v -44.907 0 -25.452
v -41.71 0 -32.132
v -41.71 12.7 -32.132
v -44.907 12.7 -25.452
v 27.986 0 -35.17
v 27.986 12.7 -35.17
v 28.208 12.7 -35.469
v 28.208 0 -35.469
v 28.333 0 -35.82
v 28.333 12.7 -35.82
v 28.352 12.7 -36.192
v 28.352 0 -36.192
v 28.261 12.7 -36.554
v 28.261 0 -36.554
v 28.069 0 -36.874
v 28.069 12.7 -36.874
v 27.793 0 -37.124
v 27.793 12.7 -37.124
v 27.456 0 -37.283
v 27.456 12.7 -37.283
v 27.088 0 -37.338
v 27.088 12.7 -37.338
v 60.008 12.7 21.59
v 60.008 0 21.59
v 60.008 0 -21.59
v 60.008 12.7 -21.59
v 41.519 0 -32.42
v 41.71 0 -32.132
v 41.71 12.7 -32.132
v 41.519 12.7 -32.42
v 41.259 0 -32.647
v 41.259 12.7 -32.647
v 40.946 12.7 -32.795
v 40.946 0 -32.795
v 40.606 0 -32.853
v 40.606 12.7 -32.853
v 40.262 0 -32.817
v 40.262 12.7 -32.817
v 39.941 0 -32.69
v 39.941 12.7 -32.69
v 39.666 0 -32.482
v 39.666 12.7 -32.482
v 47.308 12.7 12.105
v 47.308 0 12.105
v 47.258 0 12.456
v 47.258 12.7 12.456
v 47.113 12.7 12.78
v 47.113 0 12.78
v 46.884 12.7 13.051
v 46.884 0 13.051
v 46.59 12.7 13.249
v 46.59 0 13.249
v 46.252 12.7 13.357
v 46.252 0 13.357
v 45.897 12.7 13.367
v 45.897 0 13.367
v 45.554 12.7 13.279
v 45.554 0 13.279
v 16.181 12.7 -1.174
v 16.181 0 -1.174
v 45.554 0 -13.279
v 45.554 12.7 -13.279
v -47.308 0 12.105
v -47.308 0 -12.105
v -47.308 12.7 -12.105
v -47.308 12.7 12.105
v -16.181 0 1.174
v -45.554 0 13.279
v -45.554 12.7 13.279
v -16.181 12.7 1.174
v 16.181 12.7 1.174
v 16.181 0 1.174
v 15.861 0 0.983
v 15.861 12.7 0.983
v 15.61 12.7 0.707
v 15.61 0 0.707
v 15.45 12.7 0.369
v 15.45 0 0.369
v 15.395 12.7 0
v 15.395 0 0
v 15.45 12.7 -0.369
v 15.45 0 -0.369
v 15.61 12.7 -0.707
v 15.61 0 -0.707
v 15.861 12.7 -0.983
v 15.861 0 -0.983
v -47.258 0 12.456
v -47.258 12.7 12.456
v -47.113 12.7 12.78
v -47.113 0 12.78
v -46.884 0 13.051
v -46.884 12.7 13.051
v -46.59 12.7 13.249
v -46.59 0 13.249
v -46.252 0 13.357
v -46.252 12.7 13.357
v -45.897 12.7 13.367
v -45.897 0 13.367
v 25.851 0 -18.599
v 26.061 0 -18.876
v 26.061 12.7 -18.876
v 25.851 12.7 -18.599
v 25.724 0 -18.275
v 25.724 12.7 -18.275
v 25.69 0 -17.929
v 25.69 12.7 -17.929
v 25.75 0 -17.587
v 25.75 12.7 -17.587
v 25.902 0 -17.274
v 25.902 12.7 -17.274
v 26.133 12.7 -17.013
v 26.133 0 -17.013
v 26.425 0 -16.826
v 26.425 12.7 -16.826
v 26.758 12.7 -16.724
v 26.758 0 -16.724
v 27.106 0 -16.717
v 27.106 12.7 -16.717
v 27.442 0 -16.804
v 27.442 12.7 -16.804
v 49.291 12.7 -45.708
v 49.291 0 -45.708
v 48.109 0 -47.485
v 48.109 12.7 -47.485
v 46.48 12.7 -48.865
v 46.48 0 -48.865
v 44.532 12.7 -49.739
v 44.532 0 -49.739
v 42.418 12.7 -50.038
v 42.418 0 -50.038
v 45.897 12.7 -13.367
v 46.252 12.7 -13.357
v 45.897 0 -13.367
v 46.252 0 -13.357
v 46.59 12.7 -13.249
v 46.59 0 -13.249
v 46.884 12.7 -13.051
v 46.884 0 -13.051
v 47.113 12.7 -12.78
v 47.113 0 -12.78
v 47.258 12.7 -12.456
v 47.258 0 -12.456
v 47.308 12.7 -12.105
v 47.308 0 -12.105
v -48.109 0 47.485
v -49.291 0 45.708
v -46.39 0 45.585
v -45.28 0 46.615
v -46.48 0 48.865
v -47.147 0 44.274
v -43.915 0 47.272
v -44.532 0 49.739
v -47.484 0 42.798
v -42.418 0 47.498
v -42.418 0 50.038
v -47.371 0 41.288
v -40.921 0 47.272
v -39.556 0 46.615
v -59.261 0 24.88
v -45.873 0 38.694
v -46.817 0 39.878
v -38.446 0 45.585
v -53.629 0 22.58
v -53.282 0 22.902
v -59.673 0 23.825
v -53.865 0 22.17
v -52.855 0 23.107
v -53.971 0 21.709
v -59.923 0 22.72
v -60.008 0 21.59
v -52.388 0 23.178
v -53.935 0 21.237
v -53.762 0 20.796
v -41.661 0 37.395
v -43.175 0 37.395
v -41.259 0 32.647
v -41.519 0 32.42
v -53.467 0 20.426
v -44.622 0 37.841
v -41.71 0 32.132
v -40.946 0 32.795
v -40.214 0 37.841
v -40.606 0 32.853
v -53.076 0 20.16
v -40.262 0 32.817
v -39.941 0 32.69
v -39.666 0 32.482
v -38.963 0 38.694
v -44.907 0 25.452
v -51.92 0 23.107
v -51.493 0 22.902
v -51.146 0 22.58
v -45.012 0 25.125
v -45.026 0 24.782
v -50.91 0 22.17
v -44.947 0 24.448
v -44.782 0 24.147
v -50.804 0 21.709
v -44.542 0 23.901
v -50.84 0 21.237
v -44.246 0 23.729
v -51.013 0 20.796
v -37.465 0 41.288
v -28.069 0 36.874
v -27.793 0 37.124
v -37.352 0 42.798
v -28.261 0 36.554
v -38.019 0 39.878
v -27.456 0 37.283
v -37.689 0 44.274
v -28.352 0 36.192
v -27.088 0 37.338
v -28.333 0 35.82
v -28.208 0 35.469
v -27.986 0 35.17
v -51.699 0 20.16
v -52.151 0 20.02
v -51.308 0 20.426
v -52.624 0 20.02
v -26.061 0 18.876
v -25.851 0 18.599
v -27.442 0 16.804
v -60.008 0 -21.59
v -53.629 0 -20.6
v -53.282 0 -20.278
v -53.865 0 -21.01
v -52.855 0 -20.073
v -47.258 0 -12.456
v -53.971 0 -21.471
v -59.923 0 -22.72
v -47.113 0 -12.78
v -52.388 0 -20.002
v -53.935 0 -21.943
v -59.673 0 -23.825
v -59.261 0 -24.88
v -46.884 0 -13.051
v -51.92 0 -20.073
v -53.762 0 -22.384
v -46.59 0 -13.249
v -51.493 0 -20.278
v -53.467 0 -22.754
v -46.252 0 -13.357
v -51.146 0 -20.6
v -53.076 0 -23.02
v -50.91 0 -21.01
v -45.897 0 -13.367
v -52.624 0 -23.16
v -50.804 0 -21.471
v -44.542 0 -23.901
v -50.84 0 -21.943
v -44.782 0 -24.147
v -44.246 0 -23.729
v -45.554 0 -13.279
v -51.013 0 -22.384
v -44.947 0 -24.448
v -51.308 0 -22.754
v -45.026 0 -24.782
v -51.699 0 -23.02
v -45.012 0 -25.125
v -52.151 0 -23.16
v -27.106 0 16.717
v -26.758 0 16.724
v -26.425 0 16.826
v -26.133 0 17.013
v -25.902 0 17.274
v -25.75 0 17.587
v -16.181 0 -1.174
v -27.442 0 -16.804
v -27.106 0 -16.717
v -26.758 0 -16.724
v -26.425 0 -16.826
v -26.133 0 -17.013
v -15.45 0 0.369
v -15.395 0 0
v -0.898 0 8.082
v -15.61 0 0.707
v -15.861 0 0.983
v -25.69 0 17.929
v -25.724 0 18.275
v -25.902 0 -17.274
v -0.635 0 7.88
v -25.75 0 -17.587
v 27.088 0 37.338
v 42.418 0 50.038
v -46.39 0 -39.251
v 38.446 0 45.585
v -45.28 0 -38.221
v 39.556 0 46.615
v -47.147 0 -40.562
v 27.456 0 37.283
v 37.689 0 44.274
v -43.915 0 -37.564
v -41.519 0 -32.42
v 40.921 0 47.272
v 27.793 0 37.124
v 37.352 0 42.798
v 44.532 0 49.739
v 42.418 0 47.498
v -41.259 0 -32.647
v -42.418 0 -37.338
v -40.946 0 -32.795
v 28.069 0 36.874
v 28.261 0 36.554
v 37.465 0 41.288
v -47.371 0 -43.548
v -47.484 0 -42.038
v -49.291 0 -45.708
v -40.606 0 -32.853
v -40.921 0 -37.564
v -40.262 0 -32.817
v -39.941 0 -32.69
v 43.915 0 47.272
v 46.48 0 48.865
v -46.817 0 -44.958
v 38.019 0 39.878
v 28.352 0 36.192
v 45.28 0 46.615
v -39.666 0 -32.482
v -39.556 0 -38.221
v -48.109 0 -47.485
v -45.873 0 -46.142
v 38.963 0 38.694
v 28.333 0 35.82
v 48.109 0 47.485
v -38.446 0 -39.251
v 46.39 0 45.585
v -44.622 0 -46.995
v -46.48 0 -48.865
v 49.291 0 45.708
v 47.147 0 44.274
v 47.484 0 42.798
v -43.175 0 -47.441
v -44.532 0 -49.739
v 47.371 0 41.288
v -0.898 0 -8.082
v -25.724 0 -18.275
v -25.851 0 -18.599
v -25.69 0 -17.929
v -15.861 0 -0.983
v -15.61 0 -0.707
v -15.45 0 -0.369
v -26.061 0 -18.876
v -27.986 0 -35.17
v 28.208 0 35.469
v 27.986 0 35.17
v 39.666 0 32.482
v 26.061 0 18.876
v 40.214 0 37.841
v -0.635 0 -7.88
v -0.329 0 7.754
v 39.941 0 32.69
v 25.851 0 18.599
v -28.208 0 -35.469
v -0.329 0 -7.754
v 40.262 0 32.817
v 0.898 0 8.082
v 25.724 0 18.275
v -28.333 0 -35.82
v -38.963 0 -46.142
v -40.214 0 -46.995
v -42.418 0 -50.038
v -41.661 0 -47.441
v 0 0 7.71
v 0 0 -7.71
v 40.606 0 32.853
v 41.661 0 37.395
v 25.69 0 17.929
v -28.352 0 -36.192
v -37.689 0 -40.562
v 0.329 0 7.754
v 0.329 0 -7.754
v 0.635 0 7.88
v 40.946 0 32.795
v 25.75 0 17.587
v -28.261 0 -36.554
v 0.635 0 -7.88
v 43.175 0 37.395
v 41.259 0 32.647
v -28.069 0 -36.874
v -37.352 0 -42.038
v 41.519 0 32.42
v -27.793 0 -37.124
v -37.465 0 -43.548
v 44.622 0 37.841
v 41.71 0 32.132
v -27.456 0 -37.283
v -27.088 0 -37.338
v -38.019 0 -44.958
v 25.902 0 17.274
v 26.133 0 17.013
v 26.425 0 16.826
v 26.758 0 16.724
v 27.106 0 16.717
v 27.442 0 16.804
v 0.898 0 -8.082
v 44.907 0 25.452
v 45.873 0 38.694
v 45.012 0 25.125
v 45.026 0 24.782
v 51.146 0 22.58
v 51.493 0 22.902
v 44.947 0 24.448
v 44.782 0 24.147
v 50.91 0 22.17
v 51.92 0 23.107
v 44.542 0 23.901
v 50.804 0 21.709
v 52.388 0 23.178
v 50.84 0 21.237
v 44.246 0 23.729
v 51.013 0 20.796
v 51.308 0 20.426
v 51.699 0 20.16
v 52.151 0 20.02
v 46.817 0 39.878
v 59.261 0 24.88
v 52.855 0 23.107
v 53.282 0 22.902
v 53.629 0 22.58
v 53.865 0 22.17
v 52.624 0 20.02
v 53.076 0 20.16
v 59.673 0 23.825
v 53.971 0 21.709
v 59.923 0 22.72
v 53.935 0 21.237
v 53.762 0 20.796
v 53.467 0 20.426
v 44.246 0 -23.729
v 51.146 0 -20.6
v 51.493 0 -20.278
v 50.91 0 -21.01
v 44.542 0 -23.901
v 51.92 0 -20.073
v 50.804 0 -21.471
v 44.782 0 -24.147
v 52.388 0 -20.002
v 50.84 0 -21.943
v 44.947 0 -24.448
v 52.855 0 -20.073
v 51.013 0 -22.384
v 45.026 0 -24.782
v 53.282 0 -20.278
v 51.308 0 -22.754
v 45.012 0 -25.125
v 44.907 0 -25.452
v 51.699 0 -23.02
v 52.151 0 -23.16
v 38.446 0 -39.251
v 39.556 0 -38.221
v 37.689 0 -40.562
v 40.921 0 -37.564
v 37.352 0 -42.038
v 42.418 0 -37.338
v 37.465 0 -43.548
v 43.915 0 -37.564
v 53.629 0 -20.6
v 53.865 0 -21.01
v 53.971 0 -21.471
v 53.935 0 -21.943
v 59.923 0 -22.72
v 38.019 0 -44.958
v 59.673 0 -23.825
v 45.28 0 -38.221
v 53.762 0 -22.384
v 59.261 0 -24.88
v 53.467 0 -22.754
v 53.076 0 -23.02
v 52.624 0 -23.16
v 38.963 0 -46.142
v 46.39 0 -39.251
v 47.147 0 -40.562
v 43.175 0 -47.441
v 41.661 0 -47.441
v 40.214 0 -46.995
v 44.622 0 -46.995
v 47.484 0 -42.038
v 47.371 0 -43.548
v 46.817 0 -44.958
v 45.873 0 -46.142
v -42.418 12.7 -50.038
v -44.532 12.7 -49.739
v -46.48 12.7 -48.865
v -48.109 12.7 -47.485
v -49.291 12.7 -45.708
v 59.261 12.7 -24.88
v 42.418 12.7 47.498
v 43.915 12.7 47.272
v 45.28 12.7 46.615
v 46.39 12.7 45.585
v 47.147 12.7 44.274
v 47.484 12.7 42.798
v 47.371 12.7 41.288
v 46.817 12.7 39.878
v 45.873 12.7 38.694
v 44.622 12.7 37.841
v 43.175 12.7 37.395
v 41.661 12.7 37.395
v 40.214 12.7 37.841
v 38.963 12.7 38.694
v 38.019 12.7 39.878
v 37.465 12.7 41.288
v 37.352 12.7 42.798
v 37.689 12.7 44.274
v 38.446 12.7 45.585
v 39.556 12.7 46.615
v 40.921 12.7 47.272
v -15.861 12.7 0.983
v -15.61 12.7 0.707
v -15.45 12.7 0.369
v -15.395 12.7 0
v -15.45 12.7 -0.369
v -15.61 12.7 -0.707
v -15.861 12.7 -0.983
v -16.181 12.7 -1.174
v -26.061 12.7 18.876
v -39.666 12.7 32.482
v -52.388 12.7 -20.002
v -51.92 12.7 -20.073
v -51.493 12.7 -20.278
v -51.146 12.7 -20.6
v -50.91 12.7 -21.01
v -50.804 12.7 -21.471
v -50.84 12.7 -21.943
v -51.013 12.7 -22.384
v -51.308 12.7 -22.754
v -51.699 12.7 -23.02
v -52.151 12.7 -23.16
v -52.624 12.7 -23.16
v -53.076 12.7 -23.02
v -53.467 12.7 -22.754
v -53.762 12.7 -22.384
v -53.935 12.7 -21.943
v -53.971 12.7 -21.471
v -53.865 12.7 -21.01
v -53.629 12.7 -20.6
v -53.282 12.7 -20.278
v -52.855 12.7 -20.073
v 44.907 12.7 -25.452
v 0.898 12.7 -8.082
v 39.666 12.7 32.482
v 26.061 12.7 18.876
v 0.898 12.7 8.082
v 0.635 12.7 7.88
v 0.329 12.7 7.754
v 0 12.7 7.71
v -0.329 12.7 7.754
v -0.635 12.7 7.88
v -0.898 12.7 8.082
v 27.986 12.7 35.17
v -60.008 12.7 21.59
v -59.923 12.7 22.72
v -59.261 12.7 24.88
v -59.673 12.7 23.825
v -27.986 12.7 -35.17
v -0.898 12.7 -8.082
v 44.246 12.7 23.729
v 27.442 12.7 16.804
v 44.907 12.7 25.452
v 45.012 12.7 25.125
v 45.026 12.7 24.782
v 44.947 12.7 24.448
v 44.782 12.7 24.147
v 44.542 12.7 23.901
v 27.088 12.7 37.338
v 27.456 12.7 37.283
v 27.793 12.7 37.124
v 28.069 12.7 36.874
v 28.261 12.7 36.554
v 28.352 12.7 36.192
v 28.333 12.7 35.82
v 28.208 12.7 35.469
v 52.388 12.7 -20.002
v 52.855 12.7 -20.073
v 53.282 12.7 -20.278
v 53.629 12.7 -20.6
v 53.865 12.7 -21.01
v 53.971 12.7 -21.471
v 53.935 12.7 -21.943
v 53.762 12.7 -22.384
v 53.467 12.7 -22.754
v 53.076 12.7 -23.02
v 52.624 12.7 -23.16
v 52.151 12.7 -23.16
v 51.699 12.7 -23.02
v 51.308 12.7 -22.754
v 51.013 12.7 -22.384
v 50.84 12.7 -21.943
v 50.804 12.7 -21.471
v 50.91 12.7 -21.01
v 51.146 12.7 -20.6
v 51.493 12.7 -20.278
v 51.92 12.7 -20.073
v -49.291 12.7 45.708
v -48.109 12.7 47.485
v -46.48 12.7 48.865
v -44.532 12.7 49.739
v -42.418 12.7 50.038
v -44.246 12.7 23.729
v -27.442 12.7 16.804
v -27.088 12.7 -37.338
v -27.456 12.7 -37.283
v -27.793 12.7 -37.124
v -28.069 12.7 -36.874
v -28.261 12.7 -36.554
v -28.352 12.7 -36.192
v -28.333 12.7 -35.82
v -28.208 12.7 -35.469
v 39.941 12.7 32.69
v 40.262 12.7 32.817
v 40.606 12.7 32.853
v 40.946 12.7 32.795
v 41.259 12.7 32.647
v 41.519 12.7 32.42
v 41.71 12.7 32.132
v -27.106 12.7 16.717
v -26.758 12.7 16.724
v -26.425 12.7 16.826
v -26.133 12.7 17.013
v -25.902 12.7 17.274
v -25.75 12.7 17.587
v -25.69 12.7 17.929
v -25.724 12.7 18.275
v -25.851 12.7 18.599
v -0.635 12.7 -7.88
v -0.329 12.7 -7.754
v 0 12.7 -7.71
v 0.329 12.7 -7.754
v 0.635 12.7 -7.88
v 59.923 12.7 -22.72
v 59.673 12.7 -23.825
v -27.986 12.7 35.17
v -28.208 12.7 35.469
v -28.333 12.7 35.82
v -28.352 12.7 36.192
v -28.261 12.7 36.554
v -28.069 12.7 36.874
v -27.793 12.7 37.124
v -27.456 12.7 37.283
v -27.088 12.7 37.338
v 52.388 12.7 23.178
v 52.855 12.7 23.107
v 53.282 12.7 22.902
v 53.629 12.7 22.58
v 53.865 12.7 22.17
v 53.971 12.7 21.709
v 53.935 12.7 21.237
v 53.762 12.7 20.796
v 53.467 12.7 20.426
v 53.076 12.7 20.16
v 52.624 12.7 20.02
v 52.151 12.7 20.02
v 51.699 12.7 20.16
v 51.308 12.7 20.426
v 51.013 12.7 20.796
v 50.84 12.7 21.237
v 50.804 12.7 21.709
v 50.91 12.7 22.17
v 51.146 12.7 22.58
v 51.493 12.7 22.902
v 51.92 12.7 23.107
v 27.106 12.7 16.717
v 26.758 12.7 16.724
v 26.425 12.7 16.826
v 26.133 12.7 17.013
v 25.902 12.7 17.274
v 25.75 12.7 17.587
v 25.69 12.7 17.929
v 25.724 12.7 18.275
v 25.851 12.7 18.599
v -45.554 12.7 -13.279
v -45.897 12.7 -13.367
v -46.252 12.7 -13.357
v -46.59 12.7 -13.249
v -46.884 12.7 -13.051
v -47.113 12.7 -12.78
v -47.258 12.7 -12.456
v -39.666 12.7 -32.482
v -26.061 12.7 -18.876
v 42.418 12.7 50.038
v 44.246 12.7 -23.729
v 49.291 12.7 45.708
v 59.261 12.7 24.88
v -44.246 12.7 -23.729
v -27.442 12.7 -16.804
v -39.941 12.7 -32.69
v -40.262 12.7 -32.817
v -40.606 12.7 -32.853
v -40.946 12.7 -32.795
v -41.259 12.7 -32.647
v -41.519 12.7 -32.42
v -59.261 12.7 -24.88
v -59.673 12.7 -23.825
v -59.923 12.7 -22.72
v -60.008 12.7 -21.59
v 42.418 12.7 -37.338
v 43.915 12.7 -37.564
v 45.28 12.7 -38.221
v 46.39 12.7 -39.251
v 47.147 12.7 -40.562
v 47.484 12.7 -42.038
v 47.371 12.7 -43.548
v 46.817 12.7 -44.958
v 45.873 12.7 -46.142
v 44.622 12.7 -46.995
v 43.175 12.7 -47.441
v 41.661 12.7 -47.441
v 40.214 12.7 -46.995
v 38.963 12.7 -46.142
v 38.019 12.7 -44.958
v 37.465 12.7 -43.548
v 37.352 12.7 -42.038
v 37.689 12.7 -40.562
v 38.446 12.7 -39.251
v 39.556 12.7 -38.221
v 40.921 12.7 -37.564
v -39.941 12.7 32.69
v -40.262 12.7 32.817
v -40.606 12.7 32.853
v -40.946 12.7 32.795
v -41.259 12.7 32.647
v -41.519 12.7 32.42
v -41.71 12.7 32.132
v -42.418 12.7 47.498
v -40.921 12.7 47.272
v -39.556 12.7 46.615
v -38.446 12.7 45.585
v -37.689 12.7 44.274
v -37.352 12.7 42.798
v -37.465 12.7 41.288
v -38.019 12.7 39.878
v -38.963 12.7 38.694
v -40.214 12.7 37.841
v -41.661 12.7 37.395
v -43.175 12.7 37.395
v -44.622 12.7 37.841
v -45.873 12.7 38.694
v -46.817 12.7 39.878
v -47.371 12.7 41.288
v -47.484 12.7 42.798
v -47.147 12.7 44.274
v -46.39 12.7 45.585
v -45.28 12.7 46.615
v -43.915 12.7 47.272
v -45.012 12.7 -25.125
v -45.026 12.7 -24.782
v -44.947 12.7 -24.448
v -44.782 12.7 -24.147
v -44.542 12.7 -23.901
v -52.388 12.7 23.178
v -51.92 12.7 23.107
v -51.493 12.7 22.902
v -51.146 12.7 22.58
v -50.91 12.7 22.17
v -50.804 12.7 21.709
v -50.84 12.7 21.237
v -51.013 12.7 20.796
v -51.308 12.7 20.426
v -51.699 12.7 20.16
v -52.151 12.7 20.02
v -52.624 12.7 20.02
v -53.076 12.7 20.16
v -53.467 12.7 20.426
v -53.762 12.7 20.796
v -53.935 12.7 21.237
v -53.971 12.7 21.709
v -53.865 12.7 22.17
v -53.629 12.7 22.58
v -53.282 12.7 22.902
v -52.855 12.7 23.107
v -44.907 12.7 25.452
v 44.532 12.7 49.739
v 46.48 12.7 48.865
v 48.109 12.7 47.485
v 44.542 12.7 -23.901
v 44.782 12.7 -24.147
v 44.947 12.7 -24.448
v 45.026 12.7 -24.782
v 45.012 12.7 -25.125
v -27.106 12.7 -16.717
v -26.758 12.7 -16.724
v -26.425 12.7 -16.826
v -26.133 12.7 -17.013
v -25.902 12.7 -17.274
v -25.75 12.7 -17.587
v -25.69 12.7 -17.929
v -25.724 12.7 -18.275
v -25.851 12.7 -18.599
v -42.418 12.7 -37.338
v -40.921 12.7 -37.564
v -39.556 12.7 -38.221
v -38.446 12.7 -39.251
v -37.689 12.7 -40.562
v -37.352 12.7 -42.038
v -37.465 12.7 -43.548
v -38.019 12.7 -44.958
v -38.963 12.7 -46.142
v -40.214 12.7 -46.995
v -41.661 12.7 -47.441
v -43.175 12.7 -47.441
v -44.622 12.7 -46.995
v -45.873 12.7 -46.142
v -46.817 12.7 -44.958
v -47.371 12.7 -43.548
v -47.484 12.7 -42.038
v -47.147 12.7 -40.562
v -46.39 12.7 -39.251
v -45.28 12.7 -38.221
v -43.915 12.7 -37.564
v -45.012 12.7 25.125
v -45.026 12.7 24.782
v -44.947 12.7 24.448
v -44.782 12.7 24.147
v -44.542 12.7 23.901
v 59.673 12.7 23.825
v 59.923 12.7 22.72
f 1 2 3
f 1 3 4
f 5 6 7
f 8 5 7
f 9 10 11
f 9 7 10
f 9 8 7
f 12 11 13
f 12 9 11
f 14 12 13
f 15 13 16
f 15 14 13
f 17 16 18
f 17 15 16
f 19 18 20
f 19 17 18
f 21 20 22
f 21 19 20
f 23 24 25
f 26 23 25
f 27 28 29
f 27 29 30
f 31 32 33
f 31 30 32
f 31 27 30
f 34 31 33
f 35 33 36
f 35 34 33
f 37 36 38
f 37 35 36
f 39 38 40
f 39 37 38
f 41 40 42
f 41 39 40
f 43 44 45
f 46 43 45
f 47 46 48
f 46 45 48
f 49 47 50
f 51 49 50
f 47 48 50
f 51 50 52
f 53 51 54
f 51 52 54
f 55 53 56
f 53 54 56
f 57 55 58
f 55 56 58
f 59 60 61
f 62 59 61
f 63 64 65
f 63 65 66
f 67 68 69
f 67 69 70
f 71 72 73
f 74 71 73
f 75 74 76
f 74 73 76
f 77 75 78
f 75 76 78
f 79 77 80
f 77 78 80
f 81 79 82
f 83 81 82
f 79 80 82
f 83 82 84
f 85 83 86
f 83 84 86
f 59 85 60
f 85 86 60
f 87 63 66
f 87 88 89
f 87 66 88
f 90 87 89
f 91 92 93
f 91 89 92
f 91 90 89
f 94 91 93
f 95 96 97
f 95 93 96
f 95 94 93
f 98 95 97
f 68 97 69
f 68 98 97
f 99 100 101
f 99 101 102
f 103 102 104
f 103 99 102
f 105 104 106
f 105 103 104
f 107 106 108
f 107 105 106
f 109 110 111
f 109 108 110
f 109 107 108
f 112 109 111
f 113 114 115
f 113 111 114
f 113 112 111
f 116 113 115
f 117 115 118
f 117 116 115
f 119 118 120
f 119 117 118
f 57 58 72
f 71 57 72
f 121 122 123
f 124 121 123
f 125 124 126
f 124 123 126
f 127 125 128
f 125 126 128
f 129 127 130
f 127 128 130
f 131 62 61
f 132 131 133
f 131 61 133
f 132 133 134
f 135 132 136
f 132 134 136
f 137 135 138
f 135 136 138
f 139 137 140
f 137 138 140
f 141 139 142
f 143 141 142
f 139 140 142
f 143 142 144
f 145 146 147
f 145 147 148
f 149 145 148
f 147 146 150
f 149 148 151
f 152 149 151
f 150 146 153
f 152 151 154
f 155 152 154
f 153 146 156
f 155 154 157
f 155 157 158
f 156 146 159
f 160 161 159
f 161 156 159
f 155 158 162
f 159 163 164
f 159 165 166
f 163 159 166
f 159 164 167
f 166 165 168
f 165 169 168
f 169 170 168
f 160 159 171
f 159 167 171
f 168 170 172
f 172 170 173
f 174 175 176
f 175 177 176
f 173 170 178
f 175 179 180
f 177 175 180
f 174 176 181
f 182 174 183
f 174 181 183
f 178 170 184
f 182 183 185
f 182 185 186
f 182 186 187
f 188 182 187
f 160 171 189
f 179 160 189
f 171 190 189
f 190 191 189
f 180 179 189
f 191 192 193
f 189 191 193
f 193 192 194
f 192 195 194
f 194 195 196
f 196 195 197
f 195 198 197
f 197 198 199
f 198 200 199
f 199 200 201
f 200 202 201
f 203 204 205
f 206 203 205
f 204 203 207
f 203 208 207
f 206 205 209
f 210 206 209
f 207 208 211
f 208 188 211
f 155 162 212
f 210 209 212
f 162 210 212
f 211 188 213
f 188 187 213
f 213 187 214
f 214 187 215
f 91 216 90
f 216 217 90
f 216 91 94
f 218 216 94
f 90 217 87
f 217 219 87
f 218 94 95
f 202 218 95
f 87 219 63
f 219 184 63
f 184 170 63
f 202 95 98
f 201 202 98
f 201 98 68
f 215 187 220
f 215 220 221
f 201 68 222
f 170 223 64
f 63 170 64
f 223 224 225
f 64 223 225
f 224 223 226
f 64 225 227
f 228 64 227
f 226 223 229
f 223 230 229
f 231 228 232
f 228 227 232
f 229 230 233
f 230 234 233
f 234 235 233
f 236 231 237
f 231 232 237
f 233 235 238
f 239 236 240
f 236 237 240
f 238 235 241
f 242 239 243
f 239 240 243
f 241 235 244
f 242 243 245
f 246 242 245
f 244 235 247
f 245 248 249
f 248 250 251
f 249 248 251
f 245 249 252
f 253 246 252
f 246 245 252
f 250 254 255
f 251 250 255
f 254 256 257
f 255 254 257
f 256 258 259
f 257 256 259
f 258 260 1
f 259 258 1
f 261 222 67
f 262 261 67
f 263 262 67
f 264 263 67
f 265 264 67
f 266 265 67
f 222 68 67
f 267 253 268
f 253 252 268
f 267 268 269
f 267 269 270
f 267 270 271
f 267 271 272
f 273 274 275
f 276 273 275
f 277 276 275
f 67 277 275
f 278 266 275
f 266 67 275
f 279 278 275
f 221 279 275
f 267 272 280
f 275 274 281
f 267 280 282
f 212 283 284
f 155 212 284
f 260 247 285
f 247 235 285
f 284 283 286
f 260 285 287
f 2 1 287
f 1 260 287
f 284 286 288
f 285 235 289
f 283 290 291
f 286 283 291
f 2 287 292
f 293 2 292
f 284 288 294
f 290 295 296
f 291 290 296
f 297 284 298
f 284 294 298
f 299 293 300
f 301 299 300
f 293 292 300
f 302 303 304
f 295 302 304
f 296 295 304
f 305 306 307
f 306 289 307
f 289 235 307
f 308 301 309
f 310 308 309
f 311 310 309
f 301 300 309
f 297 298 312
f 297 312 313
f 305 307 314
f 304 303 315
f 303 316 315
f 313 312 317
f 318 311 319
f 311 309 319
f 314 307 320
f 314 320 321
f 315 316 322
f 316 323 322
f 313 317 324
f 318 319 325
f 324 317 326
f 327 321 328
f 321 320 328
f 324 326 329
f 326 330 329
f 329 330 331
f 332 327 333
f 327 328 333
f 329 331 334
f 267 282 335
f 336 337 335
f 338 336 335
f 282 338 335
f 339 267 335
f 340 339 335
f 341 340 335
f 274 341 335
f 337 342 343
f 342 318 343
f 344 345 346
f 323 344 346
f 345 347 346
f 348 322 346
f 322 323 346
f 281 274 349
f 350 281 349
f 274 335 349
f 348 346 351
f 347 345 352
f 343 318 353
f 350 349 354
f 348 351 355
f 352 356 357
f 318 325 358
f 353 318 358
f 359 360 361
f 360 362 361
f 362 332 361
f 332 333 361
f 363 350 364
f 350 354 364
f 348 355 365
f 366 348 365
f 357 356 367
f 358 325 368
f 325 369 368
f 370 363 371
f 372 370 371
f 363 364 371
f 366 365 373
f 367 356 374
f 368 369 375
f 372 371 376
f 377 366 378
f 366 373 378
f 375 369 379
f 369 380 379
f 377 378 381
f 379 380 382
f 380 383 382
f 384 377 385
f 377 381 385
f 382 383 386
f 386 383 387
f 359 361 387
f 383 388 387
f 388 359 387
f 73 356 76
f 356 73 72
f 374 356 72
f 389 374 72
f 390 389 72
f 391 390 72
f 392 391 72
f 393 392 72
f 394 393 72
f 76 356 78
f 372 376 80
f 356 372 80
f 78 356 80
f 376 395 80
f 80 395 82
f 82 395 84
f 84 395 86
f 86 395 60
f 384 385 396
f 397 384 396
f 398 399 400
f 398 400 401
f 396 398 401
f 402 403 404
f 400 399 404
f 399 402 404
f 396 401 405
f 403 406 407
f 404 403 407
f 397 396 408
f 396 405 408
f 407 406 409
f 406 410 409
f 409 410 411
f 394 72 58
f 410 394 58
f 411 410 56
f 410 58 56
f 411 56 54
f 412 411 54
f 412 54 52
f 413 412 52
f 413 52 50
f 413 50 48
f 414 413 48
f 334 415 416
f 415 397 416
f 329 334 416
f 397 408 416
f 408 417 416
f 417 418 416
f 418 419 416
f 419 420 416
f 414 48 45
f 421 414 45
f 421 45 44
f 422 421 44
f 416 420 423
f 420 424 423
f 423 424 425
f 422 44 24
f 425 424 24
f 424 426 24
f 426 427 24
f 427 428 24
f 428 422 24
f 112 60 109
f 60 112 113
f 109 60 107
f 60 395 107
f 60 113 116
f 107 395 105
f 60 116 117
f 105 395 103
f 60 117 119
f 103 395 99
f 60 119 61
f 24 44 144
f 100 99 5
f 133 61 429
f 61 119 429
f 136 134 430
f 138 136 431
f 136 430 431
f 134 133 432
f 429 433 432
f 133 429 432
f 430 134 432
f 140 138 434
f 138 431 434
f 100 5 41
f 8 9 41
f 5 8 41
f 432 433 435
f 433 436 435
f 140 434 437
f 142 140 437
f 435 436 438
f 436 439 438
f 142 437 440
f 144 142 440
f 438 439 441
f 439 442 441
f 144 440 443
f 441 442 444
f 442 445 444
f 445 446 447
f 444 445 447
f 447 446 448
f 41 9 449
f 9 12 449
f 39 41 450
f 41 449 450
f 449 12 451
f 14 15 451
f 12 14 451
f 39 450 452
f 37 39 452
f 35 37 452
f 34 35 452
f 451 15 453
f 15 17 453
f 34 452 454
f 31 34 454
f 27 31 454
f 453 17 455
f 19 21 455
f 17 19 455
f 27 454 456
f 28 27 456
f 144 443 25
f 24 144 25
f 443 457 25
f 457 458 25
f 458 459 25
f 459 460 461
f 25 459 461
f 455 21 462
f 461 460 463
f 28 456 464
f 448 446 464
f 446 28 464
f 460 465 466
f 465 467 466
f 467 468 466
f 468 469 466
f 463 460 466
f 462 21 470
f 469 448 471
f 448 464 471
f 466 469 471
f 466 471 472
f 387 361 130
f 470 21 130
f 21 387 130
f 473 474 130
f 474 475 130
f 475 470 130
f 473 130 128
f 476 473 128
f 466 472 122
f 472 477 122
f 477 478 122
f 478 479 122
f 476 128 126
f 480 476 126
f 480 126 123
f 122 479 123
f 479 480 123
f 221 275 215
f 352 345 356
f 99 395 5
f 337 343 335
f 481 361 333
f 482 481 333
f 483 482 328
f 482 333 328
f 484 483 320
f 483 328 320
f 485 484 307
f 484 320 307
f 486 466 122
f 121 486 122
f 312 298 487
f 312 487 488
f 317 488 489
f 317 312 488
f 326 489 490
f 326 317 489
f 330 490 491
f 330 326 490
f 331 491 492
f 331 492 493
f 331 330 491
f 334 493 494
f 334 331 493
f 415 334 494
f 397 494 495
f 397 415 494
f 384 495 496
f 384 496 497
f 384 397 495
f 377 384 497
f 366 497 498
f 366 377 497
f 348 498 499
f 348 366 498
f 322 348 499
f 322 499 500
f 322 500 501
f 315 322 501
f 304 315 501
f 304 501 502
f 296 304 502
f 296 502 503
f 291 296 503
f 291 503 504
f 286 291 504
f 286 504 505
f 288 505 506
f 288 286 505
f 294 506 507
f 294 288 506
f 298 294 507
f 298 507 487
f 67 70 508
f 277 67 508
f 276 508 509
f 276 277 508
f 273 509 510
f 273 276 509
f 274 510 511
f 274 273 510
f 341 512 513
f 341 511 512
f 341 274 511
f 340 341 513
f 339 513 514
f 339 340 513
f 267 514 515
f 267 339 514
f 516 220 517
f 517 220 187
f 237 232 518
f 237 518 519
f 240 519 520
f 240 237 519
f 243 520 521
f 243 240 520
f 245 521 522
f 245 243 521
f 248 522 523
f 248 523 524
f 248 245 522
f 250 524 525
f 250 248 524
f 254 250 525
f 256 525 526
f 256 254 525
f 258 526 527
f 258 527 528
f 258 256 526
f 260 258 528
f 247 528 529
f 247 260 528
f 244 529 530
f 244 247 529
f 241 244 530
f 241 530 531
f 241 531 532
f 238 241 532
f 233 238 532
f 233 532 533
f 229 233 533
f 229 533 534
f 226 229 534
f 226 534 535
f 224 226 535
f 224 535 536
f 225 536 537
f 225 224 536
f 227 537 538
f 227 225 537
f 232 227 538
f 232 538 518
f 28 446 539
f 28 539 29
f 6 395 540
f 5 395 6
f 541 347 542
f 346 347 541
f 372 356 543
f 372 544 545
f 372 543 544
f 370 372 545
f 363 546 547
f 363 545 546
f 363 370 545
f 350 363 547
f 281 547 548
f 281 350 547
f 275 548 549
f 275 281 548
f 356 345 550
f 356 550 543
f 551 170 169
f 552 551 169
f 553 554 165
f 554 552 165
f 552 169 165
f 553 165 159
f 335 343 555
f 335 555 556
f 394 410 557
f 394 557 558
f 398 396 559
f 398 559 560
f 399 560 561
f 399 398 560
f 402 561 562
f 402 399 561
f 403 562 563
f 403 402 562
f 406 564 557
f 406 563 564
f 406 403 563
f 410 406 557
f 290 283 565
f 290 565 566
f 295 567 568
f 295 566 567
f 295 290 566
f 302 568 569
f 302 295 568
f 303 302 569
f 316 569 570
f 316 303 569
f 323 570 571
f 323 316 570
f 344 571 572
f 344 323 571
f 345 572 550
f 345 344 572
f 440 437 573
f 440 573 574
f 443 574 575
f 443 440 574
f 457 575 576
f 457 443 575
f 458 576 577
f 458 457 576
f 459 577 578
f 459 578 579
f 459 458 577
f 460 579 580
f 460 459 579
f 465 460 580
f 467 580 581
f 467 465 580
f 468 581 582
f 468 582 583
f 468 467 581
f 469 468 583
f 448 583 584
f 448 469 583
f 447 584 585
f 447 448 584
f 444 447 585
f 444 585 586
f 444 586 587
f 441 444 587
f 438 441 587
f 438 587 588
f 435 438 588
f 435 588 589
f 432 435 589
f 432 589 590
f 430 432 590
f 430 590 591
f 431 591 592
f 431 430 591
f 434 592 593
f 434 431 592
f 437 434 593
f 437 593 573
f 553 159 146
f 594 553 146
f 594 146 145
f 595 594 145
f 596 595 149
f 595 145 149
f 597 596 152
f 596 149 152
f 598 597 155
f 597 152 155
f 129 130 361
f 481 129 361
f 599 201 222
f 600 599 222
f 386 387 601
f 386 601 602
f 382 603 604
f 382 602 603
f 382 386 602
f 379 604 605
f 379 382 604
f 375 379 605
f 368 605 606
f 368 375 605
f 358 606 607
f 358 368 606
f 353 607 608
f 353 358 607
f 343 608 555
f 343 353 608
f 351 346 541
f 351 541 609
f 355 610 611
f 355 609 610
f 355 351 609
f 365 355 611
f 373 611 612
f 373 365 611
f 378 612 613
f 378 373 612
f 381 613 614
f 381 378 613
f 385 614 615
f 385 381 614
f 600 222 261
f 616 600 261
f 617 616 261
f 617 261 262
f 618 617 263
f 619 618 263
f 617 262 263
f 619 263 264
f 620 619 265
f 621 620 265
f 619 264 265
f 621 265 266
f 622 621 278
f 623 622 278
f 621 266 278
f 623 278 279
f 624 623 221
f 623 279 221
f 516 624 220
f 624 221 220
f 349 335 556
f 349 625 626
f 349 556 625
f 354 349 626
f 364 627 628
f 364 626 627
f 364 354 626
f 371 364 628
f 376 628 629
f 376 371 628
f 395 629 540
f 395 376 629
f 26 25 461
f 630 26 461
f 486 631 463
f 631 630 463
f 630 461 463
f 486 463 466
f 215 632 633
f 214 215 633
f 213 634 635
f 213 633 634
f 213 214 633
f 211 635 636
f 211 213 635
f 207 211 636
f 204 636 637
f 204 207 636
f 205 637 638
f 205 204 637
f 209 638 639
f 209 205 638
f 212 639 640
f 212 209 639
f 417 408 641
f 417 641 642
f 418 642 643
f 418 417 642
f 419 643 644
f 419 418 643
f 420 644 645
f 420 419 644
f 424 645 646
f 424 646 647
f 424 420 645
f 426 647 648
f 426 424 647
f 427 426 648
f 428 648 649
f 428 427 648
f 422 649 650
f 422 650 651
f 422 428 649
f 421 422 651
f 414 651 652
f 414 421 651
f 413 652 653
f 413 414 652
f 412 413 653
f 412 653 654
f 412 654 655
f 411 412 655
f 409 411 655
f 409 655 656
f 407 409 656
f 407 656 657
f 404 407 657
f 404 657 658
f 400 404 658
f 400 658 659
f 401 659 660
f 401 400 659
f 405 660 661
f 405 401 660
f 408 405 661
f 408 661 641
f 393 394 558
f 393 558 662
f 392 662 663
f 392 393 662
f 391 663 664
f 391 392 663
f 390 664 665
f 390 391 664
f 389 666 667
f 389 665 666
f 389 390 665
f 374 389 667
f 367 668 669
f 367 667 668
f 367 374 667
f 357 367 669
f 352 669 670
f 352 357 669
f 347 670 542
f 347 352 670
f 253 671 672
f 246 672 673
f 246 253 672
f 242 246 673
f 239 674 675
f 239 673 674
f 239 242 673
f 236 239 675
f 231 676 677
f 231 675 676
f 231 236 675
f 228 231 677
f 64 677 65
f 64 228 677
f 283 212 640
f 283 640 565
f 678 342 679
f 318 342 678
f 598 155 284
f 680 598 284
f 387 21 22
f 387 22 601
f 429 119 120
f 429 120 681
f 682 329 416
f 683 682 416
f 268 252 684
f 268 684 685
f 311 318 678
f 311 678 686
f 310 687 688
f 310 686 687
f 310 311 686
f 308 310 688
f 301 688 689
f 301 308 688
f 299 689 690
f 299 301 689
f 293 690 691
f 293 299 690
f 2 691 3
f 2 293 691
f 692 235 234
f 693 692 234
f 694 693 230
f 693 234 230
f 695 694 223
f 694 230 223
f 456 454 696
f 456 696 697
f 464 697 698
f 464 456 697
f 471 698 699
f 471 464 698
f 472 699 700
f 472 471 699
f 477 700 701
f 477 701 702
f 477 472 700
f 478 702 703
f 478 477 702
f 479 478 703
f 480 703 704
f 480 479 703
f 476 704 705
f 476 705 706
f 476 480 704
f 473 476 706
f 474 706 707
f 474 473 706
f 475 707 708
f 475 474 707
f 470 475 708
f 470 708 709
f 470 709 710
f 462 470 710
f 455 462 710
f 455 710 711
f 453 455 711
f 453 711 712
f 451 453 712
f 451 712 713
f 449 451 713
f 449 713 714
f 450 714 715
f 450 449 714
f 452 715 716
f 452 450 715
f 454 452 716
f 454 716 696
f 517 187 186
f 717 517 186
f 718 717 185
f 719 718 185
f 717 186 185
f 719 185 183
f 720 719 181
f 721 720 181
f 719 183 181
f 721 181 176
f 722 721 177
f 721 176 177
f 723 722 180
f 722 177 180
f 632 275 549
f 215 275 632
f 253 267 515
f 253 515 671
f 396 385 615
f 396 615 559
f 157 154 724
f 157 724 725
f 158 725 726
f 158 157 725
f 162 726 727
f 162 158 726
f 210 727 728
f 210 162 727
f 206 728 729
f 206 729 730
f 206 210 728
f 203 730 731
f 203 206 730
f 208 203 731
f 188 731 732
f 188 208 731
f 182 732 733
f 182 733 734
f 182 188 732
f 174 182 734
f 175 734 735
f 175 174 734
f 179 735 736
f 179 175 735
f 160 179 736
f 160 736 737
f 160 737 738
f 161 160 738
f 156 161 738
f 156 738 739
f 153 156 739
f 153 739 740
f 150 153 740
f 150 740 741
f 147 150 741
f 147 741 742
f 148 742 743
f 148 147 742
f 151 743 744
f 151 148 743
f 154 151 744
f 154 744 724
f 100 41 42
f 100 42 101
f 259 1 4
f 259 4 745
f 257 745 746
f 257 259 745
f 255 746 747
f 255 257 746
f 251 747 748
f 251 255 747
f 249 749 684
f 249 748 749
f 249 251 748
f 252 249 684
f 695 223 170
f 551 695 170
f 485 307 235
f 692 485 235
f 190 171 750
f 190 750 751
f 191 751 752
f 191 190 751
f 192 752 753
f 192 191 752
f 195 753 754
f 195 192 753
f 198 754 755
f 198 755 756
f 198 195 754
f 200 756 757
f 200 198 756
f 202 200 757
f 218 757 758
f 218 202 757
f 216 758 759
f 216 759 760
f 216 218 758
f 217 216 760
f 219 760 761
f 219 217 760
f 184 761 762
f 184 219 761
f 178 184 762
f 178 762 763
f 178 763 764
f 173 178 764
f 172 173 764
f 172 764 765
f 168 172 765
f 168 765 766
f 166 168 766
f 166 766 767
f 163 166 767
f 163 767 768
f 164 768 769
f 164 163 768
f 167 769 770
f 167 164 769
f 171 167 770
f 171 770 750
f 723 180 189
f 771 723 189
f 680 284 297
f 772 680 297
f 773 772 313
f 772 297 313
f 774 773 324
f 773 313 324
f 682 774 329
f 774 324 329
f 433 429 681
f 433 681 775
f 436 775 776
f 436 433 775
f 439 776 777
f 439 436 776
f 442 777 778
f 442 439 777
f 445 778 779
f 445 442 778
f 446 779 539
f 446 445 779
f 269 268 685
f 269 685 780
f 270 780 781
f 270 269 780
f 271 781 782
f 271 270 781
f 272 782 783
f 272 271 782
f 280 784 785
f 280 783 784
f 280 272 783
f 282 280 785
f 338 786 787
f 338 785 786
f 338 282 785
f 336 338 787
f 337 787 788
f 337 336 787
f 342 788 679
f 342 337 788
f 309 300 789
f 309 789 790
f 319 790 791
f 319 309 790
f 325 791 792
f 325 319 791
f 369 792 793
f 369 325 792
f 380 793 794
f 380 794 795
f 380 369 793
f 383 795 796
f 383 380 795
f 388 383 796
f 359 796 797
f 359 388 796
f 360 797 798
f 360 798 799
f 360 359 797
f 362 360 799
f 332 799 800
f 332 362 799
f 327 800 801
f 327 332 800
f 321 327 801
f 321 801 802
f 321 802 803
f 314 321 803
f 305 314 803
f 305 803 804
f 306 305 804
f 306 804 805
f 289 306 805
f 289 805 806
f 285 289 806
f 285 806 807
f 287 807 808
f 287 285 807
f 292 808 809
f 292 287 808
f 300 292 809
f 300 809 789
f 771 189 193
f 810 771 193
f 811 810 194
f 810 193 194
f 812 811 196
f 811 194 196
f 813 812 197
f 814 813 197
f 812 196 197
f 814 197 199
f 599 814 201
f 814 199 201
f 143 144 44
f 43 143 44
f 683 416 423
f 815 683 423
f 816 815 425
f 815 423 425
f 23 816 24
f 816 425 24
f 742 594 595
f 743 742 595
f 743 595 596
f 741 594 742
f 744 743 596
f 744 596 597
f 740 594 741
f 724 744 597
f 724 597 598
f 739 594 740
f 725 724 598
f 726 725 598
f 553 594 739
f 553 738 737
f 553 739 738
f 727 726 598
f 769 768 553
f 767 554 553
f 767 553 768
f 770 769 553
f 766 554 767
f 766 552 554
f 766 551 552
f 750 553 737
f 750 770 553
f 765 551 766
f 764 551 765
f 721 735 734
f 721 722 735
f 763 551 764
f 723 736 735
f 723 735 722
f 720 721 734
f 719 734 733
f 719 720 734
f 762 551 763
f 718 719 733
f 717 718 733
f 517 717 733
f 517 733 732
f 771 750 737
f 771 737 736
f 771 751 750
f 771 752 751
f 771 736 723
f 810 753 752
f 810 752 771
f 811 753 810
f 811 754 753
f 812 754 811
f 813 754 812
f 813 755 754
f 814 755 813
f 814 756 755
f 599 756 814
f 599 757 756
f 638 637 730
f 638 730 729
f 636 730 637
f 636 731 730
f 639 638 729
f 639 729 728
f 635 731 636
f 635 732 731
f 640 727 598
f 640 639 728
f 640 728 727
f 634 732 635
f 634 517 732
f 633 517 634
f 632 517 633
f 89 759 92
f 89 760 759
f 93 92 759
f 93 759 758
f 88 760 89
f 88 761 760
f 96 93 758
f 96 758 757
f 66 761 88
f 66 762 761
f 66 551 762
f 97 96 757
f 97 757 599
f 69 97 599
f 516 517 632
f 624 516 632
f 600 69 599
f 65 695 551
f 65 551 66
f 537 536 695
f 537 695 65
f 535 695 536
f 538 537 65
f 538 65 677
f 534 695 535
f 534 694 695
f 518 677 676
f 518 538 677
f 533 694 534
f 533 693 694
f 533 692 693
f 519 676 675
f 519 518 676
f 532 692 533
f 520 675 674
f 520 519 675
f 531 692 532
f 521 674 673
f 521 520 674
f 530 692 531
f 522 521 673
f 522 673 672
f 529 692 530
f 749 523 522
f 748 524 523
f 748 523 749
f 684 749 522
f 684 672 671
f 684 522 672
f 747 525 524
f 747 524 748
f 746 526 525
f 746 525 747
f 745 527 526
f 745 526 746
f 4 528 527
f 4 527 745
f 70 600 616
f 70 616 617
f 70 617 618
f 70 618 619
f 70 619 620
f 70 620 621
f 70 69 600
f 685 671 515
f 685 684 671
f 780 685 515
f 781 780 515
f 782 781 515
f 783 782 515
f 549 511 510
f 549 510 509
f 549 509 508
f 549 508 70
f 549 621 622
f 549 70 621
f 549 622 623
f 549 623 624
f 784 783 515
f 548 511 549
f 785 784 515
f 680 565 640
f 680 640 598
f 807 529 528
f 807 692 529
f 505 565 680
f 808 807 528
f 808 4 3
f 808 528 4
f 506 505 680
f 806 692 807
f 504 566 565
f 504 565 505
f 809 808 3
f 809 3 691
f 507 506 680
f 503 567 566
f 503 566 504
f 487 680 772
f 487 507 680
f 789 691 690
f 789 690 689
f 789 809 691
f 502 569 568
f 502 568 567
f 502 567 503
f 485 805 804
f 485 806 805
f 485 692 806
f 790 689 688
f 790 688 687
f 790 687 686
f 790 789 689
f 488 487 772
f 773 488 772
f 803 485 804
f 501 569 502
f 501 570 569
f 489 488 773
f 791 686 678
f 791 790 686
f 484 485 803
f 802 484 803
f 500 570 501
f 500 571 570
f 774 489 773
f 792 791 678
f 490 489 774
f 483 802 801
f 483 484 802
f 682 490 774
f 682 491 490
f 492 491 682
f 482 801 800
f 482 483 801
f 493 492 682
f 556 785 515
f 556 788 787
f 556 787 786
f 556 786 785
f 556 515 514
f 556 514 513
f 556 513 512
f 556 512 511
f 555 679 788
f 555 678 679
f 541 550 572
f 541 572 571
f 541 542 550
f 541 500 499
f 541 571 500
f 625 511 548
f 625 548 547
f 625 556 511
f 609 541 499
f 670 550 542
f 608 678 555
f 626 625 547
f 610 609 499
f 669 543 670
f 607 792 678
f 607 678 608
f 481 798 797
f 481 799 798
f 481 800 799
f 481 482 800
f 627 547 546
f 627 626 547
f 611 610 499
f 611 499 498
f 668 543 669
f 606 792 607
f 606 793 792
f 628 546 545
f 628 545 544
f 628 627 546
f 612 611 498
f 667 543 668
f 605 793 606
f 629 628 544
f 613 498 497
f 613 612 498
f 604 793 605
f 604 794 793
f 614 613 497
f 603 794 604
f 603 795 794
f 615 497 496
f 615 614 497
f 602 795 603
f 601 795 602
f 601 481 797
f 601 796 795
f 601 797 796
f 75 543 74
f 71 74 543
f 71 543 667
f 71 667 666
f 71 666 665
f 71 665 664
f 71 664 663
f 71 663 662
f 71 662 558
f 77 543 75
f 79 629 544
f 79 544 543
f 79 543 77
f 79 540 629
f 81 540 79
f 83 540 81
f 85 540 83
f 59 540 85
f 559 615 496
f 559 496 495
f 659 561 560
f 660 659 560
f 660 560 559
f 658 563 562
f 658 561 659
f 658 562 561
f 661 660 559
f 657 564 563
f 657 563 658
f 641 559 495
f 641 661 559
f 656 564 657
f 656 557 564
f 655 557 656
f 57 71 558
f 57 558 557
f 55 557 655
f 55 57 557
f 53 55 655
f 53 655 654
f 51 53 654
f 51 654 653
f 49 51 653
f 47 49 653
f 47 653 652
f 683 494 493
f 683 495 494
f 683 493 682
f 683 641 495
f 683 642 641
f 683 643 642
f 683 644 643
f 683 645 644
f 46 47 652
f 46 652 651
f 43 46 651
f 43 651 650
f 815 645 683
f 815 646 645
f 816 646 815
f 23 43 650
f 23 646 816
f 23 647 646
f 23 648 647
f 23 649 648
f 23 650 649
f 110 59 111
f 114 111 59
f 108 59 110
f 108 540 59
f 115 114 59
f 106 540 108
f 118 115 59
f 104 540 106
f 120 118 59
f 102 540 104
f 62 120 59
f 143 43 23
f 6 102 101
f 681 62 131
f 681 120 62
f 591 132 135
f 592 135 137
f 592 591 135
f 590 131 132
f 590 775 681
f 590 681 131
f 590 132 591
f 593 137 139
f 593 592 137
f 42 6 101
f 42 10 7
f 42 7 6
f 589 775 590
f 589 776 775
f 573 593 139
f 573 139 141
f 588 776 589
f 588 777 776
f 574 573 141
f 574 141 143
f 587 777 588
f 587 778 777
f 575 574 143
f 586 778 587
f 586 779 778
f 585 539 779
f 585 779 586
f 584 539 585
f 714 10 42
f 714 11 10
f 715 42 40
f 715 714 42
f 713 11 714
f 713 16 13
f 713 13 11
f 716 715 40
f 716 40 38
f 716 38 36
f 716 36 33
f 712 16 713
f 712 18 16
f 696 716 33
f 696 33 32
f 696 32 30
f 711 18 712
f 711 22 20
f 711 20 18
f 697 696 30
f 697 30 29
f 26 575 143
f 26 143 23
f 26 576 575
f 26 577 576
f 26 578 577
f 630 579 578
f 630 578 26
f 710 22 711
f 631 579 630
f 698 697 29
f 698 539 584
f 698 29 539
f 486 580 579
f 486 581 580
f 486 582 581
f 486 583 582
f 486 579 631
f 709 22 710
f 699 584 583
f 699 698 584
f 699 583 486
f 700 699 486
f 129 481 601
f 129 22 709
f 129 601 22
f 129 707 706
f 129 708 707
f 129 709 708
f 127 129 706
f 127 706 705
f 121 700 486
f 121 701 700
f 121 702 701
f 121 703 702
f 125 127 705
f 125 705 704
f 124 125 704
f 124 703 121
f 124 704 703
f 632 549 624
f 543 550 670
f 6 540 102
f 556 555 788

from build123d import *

# Parameters (mm, degrees)
SKETCH1_W               = 130.175
SKETCH1_H               = 110.236
SKETCH1_R               = 1.5875
SKETCH1_R_2             = 5.08
BOSS_EXTRUDE1_DEPTH     = 12.7
CUT_EXTRUDE1_DEPTH      = 87.230311261
CUT_EXTRUDE1_DEPTH_BACK = 87.230311261
SKETCH2_OUTSIDE_W       = 166.385
SKETCH2_OUTSIDE_H       = 146.446


with BuildPart() as part:
    # Sketch1 → Boss-Extrude1 (new body)
    with BuildSketch(Plane(origin=(0, 0, 0), x_dir=(1, 0, 0), z_dir=(0, 1, 0))):
        Rectangle(SKETCH1_W, SKETCH1_H)
        with Locations(Location((-52.3875, 21.59, 0), (0, 0, 270))):
            Circle(SKETCH1_R, mode=Mode.SUBTRACT)
        with Locations(Location((52.3875, 21.59, 0), (0, 0, 270))):
            Circle(SKETCH1_R, mode=Mode.SUBTRACT)
        with Locations(Location((52.3875, -21.59, 0), (0, 0, 270))):
            Circle(SKETCH1_R, mode=Mode.SUBTRACT)
        with Locations(Location((-52.3875, -21.59, 0), (0, 0, 270))):
            Circle(SKETCH1_R, mode=Mode.SUBTRACT)
        with Locations(Location((-42.418, 42.418, 0), (0, 0, 270))):
            Circle(SKETCH1_R_2, mode=Mode.SUBTRACT)
        with Locations(Location((42.418, 42.418, 0), (0, 0, 270))):
            Circle(SKETCH1_R_2, mode=Mode.SUBTRACT)
        with Locations(Location((42.418, -42.418, 0), (0, 0, 270))):
            Circle(SKETCH1_R_2, mode=Mode.SUBTRACT)
        with Locations(Location((-42.418, -42.418, 0), (0, 0, 270))):
            Circle(SKETCH1_R_2, mode=Mode.SUBTRACT)
    extrude(amount=BOSS_EXTRUDE1_DEPTH)

    # Sketch2 outside → Cut-Extrude1 (cut, two sides: drawn at the far end of the back side and taken through both)
    # profile 1 of 9: a face of its own
    with BuildSketch(Plane(origin=(0, 12.7, 0), x_dir=(1, 0, 0), z_dir=(0, 1, 0)).offset(-CUT_EXTRUDE1_DEPTH_BACK)):
        with Locations((-0.0005, 0)):
            Rectangle(SKETCH2_OUTSIDE_W, SKETCH2_OUTSIDE_H)
        with BuildLine():
            Line((42.418, 50.038), (-42.418, 50.038))
            ThreePointArc((-42.418, 50.038), (-46.479726634, 48.865230161), (-49.291198546, 45.707915158))
            Line((-49.291198546, 45.707915158), (-59.260698546, 24.879915158))
            ThreePointArc((-59.260698546, 24.879915158), (-59.818454613, 23.276805721), (-60.0075, 21.59))
            Line((-60.0075, 21.59), (-60.0075, -21.59))
            ThreePointArc((-60.0075, -21.59), (-59.818454613, -23.276805721), (-59.260698546, -24.879915158))
            Line((-59.260698546, -24.879915158), (-49.291198546, -45.707915158))
            ThreePointArc((-49.291198546, -45.707915158), (-46.479726634, -48.865230161), (-42.418, -50.038))
            Line((-42.418, -50.038), (42.418, -50.038))
            ThreePointArc((42.418, -50.038), (46.479726634, -48.865230161), (49.291198546, -45.707915158))
            Line((49.291198546, -45.707915158), (59.260698546, -24.879915158))
            ThreePointArc((59.260698546, -24.879915158), (59.818454613, -23.276805721), (60.0075, -21.59))
            Line((60.0075, -21.59), (60.0075, 21.59))
            ThreePointArc((60.0075, 21.59), (59.818454613, 23.276805721), (59.260698546, 24.879915158))
            Line((59.260698546, 24.879915158), (49.291198546, 45.707915158))
            ThreePointArc((49.291198546, 45.707915158), (46.479726634, 48.865230161), (42.418, 50.038))
        make_face(mode=Mode.SUBTRACT)
    # profile 2 of 9: a face of its own
    with BuildSketch(Plane(origin=(0, 12.7, 0), x_dir=(1, 0, 0), z_dir=(0, 1, 0)).offset(-CUT_EXTRUDE1_DEPTH_BACK)):
        with BuildLine():
            Line((-27.087743879, -37.338), (27.087743879, -37.338))
            ThreePointArc((27.087743879, -37.338), (28.261070885, -36.554007959), (27.985769491, -35.169974388))
            Line((27.985769491, -35.169974388), (0.898025612, -8.082230509))
            ThreePointArc((0.898025612, -8.082230509), (0, -7.710256121), (-0.898025612, -8.082230509))
            Line((-0.898025612, -8.082230509), (-27.985769491, -35.169974388))
            ThreePointArc((-27.985769491, -35.169974388), (-28.261070885, -36.554007959), (-27.087743879, -37.338))
        make_face()
    # profile 3 of 9: a face of its own
    with BuildSketch(Plane(origin=(0, 12.7, 0), x_dir=(1, 0, 0), z_dir=(0, 1, 0)).offset(-CUT_EXTRUDE1_DEPTH_BACK)):
        with BuildLine():
            Line((-44.245555664, -23.729025589), (-27.442482896, -16.804122872))
            ThreePointArc((-27.442482896, -16.804122872), (-25.901976239, -17.273686348), (-26.060547132, -18.876342235))
            Line((-26.060547132, -18.876342235), (-39.665944234, -32.481739337))
            ThreePointArc((-39.665944234, -32.481739337), (-40.778186169, -32.835516971), (-41.709502937, -32.132032918))
            Line((-41.709502937, -32.132032918), (-44.907178603, -25.451538533))
            ThreePointArc((-44.907178603, -25.451538533), (-44.947197717, -24.447844803), (-44.245555664, -23.729025589))
        make_face()
    # profile 4 of 9: a face of its own
    with BuildSketch(Plane(origin=(0, 12.7, 0), x_dir=(1, 0, 0), z_dir=(0, 1, 0)).offset(-CUT_EXTRUDE1_DEPTH_BACK)):
        with BuildLine():
            Line((-45.553589848, -13.279107107), (-16.181373616, -1.174193751))
            ThreePointArc((-16.181373616, -1.174193751), (-15.395283768, 0), (-16.181373616, 1.174193751))
            Line((-16.181373616, 1.174193751), (-45.553589848, 13.279107107))
            ThreePointArc((-45.553589848, 13.279107107), (-46.744017554, 13.160248823), (-47.3075, 12.104913356))
            Line((-47.3075, 12.104913356), (-47.3075, -12.104913356))
            ThreePointArc((-47.3075, -12.104913356), (-46.744017554, -13.160248823), (-45.553589848, -13.279107107))
        make_face()
    # profile 5 of 9: a face of its own
    with BuildSketch(Plane(origin=(0, 12.7, 0), x_dir=(1, 0, 0), z_dir=(0, 1, 0)).offset(-CUT_EXTRUDE1_DEPTH_BACK)):
        with BuildLine():
            Line((-44.245555664, 23.729025589), (-27.442482896, 16.804122872))
            ThreePointArc((-27.442482896, 16.804122872), (-25.901976239, 17.273686348), (-26.060547132, 18.876342235))
            Line((-26.060547132, 18.876342235), (-39.665944234, 32.481739337))
            ThreePointArc((-39.665944234, 32.481739337), (-40.778186169, 32.835516971), (-41.709502937, 32.132032918))
            Line((-41.709502937, 32.132032918), (-44.907178603, 25.451538533))
            ThreePointArc((-44.907178603, 25.451538533), (-44.947197717, 24.447844803), (-44.245555664, 23.729025589))
        make_face()
    # profile 6 of 9: a face of its own
    with BuildSketch(Plane(origin=(0, 12.7, 0), x_dir=(1, 0, 0), z_dir=(0, 1, 0)).offset(-CUT_EXTRUDE1_DEPTH_BACK)):
        with BuildLine():
            Line((0.898025612, 8.082230509), (27.985769491, 35.169974388))
            ThreePointArc((27.985769491, 35.169974388), (28.261070885, 36.554007959), (27.087743879, 37.338))
            Line((27.087743879, 37.338), (-27.087743879, 37.338))
            ThreePointArc((-27.087743879, 37.338), (-28.261070885, 36.554007959), (-27.985769491, 35.169974388))
            Line((-27.985769491, 35.169974388), (-0.898025612, 8.082230509))
            ThreePointArc((-0.898025612, 8.082230509), (0, 7.710256121), (0.898025612, 8.082230509))
        make_face()
    # profile 7 of 9: a face of its own
    with BuildSketch(Plane(origin=(0, 12.7, 0), x_dir=(1, 0, 0), z_dir=(0, 1, 0)).offset(-CUT_EXTRUDE1_DEPTH_BACK)):
        with BuildLine():
            Line((27.442482896, 16.804122872), (44.245555664, 23.729025589))
            ThreePointArc((44.245555664, 23.729025589), (44.947197717, 24.447844803), (44.907178603, 25.451538533))
            Line((44.907178603, 25.451538533), (41.709502937, 32.132032918))
            ThreePointArc((41.709502937, 32.132032918), (40.778186169, 32.835516971), (39.665944234, 32.481739337))
            Line((39.665944234, 32.481739337), (26.060547132, 18.876342235))
            ThreePointArc((26.060547132, 18.876342235), (25.901976239, 17.273686348), (27.442482896, 16.804122872))
        make_face()
    # profile 8 of 9: a face of its own
    with BuildSketch(Plane(origin=(0, 12.7, 0), x_dir=(1, 0, 0), z_dir=(0, 1, 0)).offset(-CUT_EXTRUDE1_DEPTH_BACK)):
        with BuildLine():
            Line((16.181373616, 1.174193751), (45.553589848, 13.279107107))
            ThreePointArc((45.553589848, 13.279107107), (46.744017554, 13.160248823), (47.3075, 12.104913356))
            Line((47.3075, 12.104913356), (47.3075, -12.104913356))
            ThreePointArc((47.3075, -12.104913356), (46.744017554, -13.160248823), (45.553589848, -13.279107107))
            Line((45.553589848, -13.279107107), (16.181373616, -1.174193751))
            ThreePointArc((16.181373616, -1.174193751), (15.395283768, 0), (16.181373616, 1.174193751))
        make_face()
    # profile 9 of 9: a face of its own
    with BuildSketch(Plane(origin=(0, 12.7, 0), x_dir=(1, 0, 0), z_dir=(0, 1, 0)).offset(-CUT_EXTRUDE1_DEPTH_BACK)):
        with BuildLine():
            Line((26.060547132, -18.876342235), (39.665944234, -32.481739337))
            ThreePointArc((39.665944234, -32.481739337), (40.778186169, -32.835516971), (41.709502937, -32.132032918))
            Line((41.709502937, -32.132032918), (44.907178603, -25.451538533))
            ThreePointArc((44.907178603, -25.451538533), (44.947197717, -24.447844803), (44.245555664, -23.729025589))
            Line((44.245555664, -23.729025589), (27.442482896, -16.804122872))
            ThreePointArc((27.442482896, -16.804122872), (25.901976239, -17.273686348), (26.060547132, -18.876342235))
        make_face()
    extrude(amount=CUT_EXTRUDE1_DEPTH + CUT_EXTRUDE1_DEPTH_BACK, mode=Mode.SUBTRACT)


solid = part.part
